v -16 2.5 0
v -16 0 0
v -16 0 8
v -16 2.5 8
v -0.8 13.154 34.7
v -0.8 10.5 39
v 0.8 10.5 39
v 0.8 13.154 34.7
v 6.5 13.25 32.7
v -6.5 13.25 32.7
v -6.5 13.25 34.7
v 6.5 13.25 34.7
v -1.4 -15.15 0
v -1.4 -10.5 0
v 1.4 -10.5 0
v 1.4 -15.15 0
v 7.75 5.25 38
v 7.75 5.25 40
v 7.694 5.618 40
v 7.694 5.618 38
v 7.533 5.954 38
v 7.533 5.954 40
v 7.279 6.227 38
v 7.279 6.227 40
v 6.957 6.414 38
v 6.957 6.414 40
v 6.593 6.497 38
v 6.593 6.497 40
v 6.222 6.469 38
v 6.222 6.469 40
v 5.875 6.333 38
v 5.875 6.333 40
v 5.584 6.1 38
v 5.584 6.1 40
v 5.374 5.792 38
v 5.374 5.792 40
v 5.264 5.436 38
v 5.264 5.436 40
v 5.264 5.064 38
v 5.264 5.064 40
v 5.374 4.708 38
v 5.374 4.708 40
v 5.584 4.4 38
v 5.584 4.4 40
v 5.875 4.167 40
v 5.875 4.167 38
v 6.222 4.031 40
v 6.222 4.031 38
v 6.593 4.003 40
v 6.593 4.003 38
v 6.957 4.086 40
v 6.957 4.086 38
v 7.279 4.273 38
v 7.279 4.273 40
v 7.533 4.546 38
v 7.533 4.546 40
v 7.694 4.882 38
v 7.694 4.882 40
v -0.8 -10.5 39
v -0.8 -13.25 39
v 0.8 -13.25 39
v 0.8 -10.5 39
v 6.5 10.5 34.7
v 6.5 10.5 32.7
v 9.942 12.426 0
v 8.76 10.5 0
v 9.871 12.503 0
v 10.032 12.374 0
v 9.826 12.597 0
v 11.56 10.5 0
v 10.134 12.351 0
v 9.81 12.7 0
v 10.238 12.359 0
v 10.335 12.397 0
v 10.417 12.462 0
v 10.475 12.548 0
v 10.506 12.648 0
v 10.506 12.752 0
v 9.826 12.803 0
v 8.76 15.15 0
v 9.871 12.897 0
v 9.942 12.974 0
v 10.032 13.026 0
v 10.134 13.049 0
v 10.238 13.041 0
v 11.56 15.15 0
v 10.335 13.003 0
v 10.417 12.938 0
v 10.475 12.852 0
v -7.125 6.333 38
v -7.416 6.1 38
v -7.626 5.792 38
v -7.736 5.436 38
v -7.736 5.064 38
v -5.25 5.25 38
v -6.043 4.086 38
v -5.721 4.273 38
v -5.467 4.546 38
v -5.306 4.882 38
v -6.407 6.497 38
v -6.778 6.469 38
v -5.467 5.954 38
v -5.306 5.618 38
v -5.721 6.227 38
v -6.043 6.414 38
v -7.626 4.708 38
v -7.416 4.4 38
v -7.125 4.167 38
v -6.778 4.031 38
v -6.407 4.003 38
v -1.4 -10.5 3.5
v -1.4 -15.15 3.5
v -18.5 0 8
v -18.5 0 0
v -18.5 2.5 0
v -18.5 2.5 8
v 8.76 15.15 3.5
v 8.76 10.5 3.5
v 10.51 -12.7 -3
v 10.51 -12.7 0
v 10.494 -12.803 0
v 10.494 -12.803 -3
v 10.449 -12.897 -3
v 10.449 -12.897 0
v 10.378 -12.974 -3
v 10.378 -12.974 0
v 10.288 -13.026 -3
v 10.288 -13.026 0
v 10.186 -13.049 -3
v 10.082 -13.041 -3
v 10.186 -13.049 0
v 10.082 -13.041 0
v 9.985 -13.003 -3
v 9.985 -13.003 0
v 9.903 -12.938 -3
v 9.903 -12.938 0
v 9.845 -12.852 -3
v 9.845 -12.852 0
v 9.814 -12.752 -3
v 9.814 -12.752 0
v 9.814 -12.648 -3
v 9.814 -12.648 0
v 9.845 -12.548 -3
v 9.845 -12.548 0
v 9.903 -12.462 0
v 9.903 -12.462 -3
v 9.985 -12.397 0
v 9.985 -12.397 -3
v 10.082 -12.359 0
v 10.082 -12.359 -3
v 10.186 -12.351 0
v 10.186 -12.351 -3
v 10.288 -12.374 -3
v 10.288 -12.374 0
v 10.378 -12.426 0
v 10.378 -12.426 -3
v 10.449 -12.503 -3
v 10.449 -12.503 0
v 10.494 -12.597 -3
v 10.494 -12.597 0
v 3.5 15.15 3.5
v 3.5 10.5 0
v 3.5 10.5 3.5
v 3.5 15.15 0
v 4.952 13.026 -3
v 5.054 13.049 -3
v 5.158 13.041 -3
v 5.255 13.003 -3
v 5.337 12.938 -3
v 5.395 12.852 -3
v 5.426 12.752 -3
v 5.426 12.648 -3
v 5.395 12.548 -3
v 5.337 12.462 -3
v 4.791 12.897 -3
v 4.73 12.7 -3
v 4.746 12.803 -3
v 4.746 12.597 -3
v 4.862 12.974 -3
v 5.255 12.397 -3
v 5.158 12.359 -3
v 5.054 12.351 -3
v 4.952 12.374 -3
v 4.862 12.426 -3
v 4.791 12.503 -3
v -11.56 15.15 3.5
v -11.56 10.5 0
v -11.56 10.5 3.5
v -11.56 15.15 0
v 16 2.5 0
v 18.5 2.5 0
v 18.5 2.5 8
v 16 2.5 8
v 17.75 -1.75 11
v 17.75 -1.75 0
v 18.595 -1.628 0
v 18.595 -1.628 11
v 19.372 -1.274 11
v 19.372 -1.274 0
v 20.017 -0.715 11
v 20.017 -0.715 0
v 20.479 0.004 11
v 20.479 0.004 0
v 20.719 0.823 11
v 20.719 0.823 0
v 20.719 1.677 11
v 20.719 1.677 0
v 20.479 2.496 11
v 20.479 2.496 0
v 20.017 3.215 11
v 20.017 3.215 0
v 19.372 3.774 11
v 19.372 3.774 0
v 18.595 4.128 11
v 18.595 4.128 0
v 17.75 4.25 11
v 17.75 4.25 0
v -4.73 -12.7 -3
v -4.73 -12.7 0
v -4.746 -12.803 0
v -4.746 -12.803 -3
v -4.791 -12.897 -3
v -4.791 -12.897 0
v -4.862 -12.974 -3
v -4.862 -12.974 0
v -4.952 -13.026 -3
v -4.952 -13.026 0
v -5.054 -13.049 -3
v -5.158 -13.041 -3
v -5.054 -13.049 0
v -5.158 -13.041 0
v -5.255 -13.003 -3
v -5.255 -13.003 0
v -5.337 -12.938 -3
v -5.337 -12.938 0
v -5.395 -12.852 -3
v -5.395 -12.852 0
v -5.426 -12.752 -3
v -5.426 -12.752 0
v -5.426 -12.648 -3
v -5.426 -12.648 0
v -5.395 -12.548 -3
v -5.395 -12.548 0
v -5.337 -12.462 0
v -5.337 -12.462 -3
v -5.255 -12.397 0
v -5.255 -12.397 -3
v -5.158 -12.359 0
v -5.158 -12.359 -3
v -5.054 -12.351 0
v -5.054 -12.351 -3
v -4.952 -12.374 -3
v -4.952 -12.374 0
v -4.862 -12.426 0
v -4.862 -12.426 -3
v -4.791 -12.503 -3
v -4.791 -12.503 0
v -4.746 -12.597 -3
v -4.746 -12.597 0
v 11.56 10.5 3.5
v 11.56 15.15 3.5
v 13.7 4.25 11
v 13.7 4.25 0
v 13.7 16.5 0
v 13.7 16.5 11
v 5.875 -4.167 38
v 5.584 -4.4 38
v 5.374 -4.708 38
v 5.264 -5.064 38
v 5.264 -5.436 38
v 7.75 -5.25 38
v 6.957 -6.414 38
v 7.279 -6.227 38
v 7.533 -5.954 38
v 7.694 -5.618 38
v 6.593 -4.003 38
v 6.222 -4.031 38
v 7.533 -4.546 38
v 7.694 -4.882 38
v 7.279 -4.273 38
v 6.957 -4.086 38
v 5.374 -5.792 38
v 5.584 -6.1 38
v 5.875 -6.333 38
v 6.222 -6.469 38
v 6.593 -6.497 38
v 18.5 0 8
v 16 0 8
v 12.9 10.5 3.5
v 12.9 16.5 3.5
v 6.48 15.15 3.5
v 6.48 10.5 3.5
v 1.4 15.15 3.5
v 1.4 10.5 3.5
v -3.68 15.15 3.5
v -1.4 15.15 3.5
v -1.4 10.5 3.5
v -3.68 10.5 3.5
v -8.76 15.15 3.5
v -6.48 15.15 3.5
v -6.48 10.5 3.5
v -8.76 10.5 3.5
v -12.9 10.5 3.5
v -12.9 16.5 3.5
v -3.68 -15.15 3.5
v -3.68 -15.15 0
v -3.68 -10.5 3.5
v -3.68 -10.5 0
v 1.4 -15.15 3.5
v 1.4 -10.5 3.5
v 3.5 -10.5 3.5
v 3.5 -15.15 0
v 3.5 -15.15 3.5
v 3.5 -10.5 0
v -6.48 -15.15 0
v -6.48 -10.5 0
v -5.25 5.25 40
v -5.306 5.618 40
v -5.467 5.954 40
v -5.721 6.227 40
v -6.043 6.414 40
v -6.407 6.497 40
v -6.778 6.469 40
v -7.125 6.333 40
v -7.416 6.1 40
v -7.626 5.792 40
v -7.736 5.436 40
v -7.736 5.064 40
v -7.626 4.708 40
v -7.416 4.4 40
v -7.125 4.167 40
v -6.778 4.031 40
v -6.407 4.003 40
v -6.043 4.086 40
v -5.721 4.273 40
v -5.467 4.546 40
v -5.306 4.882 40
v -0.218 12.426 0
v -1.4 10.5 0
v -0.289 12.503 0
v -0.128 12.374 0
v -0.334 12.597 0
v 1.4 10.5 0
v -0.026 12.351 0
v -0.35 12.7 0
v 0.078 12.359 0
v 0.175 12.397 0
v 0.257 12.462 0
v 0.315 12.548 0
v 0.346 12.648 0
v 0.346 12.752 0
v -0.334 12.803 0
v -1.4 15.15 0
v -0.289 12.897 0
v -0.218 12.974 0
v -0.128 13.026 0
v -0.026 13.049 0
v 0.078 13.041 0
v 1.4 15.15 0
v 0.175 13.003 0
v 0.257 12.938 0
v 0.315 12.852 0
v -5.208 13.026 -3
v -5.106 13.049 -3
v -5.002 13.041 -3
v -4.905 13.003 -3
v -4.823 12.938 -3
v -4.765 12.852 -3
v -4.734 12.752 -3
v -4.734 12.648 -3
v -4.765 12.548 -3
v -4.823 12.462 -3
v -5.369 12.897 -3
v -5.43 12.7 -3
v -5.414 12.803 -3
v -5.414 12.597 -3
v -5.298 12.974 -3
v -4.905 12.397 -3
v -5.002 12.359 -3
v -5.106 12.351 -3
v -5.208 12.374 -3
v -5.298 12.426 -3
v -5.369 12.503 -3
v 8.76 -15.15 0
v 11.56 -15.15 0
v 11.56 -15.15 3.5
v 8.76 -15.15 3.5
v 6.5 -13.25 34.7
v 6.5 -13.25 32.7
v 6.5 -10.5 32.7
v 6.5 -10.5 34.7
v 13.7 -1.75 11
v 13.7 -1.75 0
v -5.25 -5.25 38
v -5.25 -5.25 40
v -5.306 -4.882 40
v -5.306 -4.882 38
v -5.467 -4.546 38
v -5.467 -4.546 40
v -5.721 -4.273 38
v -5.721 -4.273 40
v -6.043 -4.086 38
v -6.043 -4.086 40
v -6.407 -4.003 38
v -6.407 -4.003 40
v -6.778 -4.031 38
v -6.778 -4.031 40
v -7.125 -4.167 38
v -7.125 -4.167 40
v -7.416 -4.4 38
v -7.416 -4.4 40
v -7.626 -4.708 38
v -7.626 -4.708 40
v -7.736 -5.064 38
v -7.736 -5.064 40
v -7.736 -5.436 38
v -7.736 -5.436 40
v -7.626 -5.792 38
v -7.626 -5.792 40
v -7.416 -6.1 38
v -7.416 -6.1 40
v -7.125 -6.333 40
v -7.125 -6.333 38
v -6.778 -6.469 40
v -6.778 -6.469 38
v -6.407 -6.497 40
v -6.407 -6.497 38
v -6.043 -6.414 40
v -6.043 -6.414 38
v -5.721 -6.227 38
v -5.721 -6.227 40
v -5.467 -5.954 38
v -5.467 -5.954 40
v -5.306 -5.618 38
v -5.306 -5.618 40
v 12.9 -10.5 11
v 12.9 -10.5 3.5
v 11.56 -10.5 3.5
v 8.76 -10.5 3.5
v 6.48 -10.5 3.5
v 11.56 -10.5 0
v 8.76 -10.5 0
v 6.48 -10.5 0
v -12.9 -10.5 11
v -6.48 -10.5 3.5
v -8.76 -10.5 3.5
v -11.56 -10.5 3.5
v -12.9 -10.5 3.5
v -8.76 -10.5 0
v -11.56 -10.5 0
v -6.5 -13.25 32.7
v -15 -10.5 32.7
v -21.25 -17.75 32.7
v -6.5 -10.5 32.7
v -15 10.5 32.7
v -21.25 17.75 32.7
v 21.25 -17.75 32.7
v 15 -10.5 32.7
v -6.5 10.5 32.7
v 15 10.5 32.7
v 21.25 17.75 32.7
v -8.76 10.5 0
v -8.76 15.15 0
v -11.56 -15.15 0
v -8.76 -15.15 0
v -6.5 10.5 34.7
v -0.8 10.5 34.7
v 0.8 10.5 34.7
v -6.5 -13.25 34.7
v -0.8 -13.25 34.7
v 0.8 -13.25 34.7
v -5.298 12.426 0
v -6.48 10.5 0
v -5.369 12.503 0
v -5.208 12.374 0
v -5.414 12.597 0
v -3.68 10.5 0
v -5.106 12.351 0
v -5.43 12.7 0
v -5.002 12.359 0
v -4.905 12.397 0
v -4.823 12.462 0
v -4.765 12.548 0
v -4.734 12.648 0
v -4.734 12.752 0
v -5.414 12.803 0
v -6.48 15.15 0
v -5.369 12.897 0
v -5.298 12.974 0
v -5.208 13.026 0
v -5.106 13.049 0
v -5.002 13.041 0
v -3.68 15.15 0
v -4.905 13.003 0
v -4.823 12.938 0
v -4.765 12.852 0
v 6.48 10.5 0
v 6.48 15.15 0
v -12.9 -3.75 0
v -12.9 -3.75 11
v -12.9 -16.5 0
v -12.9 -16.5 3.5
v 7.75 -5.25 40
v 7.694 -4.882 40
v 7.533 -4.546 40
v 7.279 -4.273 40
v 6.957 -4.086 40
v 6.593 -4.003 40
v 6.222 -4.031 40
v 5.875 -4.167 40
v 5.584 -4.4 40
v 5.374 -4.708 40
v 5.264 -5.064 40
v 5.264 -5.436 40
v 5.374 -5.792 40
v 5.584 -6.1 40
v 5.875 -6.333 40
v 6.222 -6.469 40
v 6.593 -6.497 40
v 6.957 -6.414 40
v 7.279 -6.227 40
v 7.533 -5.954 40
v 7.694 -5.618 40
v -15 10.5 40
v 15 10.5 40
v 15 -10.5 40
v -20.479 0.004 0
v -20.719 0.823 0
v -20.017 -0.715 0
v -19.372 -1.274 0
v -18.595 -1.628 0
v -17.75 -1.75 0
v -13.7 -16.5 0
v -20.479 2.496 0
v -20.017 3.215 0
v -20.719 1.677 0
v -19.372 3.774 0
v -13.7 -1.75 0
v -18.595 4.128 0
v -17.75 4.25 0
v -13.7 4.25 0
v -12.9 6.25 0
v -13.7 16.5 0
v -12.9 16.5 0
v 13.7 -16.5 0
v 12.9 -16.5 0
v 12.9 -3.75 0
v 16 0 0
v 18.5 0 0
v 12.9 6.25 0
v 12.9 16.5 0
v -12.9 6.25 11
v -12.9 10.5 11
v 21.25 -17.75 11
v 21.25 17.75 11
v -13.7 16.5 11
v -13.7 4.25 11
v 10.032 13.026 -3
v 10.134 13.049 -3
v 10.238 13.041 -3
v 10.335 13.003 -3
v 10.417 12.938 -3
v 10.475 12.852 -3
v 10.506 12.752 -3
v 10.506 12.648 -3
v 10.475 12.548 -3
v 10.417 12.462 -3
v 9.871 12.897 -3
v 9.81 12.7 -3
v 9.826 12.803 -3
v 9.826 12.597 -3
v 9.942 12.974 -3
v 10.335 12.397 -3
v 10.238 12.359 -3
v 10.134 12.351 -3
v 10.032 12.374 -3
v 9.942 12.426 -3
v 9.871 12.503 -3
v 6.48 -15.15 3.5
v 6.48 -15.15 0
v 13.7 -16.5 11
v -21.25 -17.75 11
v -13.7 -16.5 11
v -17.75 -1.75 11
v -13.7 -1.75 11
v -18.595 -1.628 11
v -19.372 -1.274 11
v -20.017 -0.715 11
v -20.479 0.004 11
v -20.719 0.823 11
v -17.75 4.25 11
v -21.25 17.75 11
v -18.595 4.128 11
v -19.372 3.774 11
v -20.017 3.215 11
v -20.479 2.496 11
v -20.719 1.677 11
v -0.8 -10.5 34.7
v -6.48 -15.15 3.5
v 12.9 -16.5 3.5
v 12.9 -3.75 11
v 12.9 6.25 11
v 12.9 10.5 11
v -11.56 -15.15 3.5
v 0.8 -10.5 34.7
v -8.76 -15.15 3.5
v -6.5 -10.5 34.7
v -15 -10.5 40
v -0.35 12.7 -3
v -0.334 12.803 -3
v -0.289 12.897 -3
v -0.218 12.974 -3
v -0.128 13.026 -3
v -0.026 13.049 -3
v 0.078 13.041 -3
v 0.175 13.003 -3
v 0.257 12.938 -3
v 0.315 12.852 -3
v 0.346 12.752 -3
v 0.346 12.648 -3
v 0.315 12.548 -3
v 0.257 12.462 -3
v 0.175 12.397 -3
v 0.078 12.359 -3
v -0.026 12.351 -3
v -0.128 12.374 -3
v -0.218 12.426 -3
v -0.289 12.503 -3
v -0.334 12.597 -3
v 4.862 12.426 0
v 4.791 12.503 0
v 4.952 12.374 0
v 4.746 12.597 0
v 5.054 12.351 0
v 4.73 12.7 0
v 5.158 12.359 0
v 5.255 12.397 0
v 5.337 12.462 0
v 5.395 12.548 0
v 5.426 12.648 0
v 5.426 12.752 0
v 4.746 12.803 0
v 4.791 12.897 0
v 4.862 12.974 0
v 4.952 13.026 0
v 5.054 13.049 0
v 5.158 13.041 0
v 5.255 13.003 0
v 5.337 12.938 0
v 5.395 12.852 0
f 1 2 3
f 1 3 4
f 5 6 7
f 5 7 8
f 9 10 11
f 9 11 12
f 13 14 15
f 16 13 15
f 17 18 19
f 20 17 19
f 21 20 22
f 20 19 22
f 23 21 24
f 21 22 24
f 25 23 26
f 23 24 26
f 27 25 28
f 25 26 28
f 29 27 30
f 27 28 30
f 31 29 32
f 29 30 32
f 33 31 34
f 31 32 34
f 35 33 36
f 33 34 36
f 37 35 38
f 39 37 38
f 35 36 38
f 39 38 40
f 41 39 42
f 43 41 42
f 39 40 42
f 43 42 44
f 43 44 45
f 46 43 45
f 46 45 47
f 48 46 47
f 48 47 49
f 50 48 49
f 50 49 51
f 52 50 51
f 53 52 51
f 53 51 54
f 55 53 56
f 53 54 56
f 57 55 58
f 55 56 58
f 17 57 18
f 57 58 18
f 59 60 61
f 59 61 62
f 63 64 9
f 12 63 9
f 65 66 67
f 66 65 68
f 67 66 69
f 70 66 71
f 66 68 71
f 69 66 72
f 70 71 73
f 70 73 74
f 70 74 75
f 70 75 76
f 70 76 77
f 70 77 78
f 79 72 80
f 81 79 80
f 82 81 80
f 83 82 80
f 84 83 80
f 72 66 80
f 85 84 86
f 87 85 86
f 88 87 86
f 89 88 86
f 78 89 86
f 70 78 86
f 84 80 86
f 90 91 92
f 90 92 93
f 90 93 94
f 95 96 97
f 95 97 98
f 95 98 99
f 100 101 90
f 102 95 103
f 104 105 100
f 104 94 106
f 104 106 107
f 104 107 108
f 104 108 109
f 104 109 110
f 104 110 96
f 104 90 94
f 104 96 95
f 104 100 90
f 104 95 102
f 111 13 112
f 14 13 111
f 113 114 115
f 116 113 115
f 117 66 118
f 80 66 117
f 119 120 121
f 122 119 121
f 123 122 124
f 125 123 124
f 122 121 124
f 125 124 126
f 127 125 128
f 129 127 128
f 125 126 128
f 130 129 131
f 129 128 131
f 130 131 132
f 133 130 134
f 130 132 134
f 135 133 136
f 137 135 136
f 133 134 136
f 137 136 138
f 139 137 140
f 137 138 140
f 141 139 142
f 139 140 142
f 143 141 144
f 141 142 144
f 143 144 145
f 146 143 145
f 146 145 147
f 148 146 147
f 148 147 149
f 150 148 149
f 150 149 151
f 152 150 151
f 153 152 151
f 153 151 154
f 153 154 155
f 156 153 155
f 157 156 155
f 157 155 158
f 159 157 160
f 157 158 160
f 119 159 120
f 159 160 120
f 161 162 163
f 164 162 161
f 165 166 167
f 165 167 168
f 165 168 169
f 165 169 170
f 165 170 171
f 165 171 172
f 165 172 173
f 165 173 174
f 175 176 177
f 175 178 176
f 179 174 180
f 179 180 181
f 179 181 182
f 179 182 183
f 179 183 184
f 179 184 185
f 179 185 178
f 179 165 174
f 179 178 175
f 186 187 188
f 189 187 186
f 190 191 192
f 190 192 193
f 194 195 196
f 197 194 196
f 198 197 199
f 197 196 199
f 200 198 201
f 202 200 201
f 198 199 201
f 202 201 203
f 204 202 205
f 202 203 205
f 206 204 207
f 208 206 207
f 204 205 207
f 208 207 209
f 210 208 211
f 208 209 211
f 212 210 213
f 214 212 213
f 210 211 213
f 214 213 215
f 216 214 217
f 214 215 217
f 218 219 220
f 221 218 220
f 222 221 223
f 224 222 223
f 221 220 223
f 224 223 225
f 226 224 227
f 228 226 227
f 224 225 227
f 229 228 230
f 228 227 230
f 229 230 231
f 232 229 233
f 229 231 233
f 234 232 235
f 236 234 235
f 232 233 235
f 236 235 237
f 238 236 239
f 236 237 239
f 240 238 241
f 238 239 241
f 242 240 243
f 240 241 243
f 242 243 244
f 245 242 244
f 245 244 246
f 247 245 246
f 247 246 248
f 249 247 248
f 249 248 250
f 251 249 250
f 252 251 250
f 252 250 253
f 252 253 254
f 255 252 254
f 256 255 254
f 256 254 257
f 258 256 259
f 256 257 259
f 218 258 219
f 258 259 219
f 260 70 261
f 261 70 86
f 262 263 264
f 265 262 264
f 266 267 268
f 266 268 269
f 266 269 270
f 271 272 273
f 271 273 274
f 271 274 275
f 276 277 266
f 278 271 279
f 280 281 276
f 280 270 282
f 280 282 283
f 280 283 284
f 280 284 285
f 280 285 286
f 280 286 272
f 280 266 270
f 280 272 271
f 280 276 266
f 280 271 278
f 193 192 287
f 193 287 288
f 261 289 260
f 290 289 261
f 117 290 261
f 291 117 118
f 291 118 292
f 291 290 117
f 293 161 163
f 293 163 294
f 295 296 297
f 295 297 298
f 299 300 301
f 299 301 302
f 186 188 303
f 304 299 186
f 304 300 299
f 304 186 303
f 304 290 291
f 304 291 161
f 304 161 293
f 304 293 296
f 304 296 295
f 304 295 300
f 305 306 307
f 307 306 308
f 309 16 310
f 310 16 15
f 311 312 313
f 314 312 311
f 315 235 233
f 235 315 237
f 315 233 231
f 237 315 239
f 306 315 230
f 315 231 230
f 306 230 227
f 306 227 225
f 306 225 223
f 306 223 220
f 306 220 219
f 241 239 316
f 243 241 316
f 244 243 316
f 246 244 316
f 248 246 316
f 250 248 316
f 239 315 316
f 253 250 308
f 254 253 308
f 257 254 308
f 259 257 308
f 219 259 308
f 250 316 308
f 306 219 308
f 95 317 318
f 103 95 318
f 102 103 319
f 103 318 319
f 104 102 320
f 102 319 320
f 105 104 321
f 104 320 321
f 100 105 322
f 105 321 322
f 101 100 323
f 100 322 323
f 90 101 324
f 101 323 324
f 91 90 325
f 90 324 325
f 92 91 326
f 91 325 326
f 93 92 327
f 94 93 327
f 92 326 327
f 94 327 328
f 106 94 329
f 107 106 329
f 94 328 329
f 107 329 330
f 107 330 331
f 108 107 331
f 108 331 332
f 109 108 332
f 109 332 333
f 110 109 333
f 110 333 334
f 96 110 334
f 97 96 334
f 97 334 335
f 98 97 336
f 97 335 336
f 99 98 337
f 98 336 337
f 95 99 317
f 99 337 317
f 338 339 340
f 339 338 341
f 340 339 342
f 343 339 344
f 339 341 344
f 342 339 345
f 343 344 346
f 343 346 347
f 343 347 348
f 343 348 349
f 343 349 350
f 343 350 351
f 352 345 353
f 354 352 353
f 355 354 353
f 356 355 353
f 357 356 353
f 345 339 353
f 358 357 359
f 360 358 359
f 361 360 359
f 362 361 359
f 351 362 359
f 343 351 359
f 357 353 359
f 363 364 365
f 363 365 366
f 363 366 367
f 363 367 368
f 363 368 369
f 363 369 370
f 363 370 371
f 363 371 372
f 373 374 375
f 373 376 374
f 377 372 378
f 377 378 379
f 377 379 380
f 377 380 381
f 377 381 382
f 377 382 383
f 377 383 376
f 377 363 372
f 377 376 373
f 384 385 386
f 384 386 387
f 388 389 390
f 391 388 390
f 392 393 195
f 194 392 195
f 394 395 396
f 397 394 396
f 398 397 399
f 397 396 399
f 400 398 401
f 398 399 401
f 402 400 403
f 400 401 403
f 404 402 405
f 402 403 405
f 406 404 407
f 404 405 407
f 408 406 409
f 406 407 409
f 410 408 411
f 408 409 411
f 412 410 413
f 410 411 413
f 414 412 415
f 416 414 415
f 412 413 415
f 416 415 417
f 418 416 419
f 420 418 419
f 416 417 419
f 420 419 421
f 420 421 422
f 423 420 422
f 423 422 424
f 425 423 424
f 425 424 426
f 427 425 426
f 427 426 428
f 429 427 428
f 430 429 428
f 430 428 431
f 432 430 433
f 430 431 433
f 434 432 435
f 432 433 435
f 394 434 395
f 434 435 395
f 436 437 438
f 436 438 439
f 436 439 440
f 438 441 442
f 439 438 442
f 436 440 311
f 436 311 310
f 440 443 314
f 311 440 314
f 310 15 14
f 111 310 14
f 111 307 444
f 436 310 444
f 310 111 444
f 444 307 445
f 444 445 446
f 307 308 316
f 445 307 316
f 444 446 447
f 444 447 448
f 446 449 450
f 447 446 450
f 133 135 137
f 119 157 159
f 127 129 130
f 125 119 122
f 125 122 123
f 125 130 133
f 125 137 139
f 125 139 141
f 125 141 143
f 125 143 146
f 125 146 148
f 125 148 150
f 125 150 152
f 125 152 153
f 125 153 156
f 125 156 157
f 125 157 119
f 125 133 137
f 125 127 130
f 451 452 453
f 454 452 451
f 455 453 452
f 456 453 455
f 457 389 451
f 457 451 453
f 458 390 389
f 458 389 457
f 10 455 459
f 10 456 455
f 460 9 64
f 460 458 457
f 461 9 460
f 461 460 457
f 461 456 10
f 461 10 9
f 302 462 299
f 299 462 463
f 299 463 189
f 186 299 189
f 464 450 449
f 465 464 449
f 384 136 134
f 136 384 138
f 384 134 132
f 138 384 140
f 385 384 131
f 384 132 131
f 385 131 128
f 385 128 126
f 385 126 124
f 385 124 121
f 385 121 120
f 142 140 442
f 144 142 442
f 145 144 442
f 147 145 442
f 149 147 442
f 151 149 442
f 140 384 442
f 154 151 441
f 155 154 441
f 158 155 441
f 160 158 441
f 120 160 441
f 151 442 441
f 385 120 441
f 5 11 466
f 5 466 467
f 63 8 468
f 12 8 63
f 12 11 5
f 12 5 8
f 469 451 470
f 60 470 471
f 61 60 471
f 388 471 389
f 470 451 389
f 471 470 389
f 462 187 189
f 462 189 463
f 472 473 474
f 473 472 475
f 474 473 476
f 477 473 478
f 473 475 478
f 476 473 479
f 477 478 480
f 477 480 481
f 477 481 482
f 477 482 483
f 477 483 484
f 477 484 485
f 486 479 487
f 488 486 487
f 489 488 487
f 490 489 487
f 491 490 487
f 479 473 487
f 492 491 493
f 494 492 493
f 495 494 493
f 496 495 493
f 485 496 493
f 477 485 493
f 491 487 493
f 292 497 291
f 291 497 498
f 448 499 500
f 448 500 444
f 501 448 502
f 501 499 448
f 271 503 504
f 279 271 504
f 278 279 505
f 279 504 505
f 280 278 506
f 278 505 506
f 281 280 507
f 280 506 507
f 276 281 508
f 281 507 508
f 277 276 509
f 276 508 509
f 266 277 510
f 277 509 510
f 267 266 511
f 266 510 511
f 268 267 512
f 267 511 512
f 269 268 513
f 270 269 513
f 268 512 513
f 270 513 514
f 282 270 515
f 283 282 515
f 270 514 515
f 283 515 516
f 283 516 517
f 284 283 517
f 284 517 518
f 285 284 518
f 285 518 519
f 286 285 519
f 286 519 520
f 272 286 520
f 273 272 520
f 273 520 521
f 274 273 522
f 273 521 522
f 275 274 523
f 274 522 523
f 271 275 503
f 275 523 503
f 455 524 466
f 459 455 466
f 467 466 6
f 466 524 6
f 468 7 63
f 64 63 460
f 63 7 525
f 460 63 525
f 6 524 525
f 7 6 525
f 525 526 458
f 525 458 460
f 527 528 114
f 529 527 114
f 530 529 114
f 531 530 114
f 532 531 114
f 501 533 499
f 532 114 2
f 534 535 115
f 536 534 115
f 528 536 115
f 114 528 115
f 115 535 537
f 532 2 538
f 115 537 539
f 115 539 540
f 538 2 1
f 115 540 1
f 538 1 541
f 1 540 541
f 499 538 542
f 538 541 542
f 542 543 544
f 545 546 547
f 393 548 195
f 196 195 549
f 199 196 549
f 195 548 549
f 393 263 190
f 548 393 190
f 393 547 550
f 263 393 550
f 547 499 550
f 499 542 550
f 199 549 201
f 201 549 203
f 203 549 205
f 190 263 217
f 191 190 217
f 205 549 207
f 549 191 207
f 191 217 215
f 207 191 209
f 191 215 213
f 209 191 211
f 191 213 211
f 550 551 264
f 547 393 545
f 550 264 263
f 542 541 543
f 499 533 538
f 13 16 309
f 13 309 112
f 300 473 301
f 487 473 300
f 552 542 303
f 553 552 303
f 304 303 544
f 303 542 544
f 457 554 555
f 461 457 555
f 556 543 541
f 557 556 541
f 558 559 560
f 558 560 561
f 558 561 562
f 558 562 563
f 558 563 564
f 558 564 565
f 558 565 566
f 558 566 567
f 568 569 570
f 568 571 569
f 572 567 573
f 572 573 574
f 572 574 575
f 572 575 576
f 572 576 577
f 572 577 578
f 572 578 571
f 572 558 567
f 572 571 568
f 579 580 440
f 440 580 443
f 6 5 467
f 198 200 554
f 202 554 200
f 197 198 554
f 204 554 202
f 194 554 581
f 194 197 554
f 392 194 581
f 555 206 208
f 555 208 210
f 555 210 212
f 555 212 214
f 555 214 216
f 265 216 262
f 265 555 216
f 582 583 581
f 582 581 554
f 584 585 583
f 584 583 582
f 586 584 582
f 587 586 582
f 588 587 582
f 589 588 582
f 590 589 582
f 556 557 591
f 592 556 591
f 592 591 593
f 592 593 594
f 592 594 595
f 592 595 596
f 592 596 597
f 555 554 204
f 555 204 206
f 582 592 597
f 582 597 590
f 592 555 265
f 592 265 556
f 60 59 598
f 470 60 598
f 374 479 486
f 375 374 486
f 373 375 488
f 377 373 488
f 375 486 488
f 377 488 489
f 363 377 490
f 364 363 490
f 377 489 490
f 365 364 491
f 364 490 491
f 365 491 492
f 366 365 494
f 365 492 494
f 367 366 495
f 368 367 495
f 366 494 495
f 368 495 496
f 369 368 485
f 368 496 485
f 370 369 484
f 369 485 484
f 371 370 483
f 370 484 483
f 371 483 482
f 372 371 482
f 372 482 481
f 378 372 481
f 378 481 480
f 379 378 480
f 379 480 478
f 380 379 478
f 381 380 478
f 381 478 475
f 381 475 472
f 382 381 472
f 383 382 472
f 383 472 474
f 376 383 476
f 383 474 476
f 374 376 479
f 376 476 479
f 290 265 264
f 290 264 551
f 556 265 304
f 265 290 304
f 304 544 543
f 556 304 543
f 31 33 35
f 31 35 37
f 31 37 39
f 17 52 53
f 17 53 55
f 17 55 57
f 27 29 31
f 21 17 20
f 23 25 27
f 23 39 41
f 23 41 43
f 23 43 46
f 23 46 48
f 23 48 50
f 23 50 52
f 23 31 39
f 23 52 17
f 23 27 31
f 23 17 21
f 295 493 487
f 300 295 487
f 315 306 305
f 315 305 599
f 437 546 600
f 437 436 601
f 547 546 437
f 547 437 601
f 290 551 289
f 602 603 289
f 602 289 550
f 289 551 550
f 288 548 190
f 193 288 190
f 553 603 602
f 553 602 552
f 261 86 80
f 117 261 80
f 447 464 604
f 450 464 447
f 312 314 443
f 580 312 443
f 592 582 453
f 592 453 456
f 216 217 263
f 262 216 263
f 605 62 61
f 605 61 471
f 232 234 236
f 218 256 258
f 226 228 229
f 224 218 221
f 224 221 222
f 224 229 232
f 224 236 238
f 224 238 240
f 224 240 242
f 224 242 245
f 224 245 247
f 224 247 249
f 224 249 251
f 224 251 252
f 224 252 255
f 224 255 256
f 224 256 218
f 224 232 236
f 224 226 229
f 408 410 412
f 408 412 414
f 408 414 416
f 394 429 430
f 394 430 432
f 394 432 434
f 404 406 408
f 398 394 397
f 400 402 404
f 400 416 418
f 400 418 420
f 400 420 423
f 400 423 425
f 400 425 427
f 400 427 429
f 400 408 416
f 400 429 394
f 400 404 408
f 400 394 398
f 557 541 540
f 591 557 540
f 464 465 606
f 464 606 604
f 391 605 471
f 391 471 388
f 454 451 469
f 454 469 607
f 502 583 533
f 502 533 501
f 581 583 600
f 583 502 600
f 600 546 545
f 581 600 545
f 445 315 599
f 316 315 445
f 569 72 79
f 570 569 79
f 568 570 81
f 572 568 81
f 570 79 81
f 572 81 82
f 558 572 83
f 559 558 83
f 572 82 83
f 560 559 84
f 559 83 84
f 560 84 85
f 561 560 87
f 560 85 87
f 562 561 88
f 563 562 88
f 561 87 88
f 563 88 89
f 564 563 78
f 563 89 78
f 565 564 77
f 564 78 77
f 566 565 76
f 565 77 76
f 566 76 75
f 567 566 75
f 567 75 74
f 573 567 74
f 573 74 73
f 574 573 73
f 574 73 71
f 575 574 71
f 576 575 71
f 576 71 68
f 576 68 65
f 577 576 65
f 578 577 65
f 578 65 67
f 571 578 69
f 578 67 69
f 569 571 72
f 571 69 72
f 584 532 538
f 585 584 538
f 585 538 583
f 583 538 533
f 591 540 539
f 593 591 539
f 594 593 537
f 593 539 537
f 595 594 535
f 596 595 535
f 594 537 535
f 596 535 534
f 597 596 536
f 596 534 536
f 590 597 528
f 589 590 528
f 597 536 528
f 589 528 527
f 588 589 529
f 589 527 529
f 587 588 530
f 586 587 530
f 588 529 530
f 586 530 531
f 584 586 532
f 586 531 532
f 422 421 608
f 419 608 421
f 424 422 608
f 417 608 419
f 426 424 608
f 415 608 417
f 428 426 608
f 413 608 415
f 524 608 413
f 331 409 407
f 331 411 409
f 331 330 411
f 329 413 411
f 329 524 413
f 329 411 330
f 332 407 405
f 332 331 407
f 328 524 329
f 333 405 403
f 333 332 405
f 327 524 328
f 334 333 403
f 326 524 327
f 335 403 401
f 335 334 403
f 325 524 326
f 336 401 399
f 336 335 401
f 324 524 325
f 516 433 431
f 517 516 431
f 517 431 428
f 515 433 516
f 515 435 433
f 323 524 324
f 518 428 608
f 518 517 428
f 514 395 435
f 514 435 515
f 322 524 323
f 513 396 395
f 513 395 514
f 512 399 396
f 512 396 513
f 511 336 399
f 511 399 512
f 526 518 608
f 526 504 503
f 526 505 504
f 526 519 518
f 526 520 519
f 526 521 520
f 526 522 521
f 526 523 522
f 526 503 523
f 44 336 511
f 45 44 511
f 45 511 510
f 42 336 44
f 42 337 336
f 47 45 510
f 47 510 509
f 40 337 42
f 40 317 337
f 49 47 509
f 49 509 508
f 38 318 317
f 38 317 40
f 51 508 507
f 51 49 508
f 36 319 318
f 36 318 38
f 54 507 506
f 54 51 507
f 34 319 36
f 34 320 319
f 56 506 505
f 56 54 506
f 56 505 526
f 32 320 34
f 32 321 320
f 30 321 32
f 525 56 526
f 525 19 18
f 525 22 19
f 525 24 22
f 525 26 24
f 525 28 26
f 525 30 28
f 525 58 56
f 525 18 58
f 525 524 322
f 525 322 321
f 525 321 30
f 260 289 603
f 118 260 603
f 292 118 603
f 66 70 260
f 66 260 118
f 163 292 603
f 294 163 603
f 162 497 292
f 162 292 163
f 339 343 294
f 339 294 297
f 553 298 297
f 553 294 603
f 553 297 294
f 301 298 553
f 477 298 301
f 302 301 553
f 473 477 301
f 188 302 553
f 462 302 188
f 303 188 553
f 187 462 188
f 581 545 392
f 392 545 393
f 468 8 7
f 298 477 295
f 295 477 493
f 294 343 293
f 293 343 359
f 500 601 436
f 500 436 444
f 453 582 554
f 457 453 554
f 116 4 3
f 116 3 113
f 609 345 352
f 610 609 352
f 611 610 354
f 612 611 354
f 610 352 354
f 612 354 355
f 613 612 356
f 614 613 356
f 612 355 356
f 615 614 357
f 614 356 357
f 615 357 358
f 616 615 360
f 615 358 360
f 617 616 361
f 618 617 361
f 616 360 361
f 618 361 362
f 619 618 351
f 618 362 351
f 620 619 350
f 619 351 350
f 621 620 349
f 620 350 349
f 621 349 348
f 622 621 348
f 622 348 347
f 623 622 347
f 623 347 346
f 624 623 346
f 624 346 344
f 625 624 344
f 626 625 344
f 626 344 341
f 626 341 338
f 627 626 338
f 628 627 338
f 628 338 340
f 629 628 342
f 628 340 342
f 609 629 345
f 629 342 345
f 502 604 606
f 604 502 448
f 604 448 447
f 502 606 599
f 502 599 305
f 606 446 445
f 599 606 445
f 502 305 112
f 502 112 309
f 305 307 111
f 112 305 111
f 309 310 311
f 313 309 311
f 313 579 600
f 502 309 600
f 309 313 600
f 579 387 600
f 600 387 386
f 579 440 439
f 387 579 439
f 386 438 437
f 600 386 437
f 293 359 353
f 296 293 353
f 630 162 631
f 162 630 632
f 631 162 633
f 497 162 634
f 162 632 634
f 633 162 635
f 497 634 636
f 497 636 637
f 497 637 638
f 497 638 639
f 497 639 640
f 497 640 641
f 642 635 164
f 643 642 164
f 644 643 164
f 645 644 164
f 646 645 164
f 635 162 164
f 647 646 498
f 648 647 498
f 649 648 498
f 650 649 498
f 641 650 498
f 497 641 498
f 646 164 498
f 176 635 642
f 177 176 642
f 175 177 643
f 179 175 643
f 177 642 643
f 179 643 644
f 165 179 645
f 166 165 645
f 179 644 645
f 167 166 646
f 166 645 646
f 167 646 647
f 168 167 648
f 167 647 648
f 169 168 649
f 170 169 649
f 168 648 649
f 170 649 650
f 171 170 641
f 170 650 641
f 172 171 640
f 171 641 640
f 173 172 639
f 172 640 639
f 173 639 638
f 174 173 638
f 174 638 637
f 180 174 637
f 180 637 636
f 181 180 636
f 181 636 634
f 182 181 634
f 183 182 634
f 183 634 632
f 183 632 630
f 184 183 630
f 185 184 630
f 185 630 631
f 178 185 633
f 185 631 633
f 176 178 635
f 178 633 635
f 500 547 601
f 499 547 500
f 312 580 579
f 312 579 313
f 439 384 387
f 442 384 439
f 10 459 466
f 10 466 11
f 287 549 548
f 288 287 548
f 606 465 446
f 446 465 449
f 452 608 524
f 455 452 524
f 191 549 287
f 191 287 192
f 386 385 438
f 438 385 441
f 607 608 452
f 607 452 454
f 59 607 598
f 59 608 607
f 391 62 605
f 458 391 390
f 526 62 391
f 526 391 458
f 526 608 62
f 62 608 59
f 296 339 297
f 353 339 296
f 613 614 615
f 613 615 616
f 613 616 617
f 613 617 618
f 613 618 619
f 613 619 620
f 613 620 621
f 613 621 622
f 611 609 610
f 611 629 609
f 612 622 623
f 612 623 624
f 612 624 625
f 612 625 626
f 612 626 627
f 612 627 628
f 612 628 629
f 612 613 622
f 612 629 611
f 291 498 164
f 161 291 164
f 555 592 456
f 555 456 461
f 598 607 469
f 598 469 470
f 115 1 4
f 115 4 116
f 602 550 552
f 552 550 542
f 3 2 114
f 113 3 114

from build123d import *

# Parameters (mm, degrees)
SKETCH_1_W                 = 42.5
SKETCH_1_H                 = 35.5
EXTRUDE_1_DEPTH            = 40
SKETCH_2_W                 = 42.5
SKETCH_2_H                 = 35.5
SKETCH_2_W_2               = 30
SKETCH_2_H_2               = 21
CUT_EXTRUDE_1_DEPTH        = 7.3
SKETCH_3_W                 = 13
SKETCH_3_H                 = 26.5
EXTRUDE_2_DEPTH            = 2
EXTRUDE_3_DEPTH            = 0.8
EXTRUDE_3_DEPTH_BACK       = 0.8
SKETCH_4_W                 = 4.3
SKETCH_4_H                 = 2.75
SKETCH_5_R                 = 1.25
CUT_EXTRUDE_2_DEPTH        = 2
SKETCH_6_W                 = 42.5
SKETCH_6_H                 = 35.5
CUT_EXTRUDE_3_DEPTH        = 11
SKETCH_7_W                 = 2.5
SKETCH_7_H                 = 2.5
CUT_EXTRUDE_4_DEPTH        = 8
SKETCH_8_W                 = 25.8
SKETCH_8_H                 = 4.25
SKETCH_8_H_2               = 6.75
CUT_EXTRUDE_5_DEPTH        = 11
CUT_EXTRUDE_6_DEPTH        = 3.5
SKETCH_10_W                = 2.1
SKETCH_10_H                = 4.65
SKETCH_10_W_2              = 2.28
SKETCH_10_W_3              = 0.939967479
CUT_EXTRUDE_7_DEPTH        = 3.5
SKETCH_11_R                = 0.35
EXTRUDE_4_DEPTH            = 3
PATTERN_LINEAR_1_COUNT     = 3
PATTERN_LINEAR_1_PITCH     = 5.08
PATTERN_LINEAR_1_COL_COUNT = 3
PATTERN_LINEAR_1_COL_PITCH = 5.08
CUT_EXTRUDE_START          = -3
SKETCH_12_R                = 0.35
CUT_EXTRUDE_8_DEPTH        = 3


with BuildPart() as part:
    # Эскиз1 → Вытянуть1 (new body)
    with BuildSketch(Plane.XY):
        Rectangle(SKETCH_1_W, SKETCH_1_H)
    extrude(amount=EXTRUDE_1_DEPTH)

    # Эскиз2 → Вырез-Вытянуть1 (cut)
    with BuildSketch(Plane.XY.offset(40)):
        Rectangle(SKETCH_2_W, SKETCH_2_H)
        Rectangle(SKETCH_2_W_2, SKETCH_2_H_2, mode=Mode.SUBTRACT)
    extrude(amount=-CUT_EXTRUDE_1_DEPTH, mode=Mode.SUBTRACT)

    # Эскиз3 → Вытянуть2 (add)
    with BuildSketch(Plane.XY.offset(32.7)):
        Rectangle(SKETCH_3_W, SKETCH_3_H)
    extrude(amount=EXTRUDE_2_DEPTH)

    # Эскиз4 → Вытянуть3 (add, two sides: drawn at the far end of the back side and taken through both)
    with BuildSketch(Plane(origin=(0, 0, 0), x_dir=(0, 0, -1), z_dir=(1, 0, 0)).offset(-EXTRUDE_3_DEPTH_BACK)):
        Polygon((-34.7, 10.5), (-39, 10.5), (-34.7, 13.153893026), align=None)
        with Locations((-36.85, -11.875)):
            Rectangle(SKETCH_4_W, SKETCH_4_H)
    extrude(amount=EXTRUDE_3_DEPTH + EXTRUDE_3_DEPTH_BACK)

    # Эскиз5 → Вырез-Вытянуть2 (cut)
    with BuildSketch(Plane.XY.offset(40)):
        with Locations((-6.5, 5.25)):
            Circle(SKETCH_5_R)
        with Locations((6.5, 5.25)):
            Circle(SKETCH_5_R)
        with Locations((6.5, -5.25)):
            Circle(SKETCH_5_R)
        with Locations((-6.5, -5.25)):
            Circle(SKETCH_5_R)
    extrude(amount=-CUT_EXTRUDE_2_DEPTH, mode=Mode.SUBTRACT)

    # Эскиз6 → Вырез-Вытянуть3 (cut)
    with BuildSketch(Plane(origin=(0, 0, 0), x_dir=(-1, 0, 0), z_dir=(0, 0, -1))):
        Rectangle(SKETCH_6_W, SKETCH_6_H)
        with BuildLine():
            Line((-17.75, 4.25), (-13.7, 4.25))
            Line((-13.7, 4.25), (-13.7, 16.5))
            Line((-13.7, 16.5), (13.7, 16.5))
            Line((13.7, 16.5), (13.7, 4.25))
            Line((13.7, 4.25), (17.75, 4.25))
            ThreePointArc((17.75, 4.25), (20.75, 1.25), (17.75, -1.75))
            Line((17.75, -1.75), (13.7, -1.75))
            Line((13.7, -1.75), (13.7, -16.5))
            Line((13.7, -16.5), (-13.7, -16.5))
            Line((-13.7, -16.5), (-13.7, -1.75))
            Line((-13.7, -1.75), (-17.75, -1.75))
            ThreePointArc((-17.75, -1.75), (-20.75, 1.25), (-17.75, 4.25))
        make_face(mode=Mode.SUBTRACT)
    extrude(amount=-CUT_EXTRUDE_3_DEPTH, mode=Mode.SUBTRACT)

    # Эскиз7 → Вырез-Вытянуть4 (cut)
    with BuildSketch(Plane(origin=(0, 0, 0), x_dir=(-1, 0, 0), z_dir=(0, 0, -1))):
        with Locations((17.25, 1.25)):
            Rectangle(SKETCH_7_W, SKETCH_7_H)
        with Locations((-17.25, 1.25)):
            Rectangle(SKETCH_7_W, SKETCH_7_H)
    extrude(amount=-CUT_EXTRUDE_4_DEPTH, mode=Mode.SUBTRACT)

    # Эскиз8 → Вырез-Вытянуть5 (cut)
    with BuildSketch(Plane(origin=(0, 0, 0), x_dir=(-1, 0, 0), z_dir=(0, 0, -1))):
        with Locations((0, 8.375)):
            Rectangle(SKETCH_8_W, SKETCH_8_H)
        with Locations((0, -7.125)):
            Rectangle(SKETCH_8_W, SKETCH_8_H_2)
    extrude(amount=-CUT_EXTRUDE_5_DEPTH, mode=Mode.SUBTRACT)

    # Эскиз9 → Вырез-Вытянуть6 (cut)
    with BuildSketch(Plane(origin=(0, 0, 0), x_dir=(-1, 0, 0), z_dir=(0, 0, -1))):
        Polygon((12.9, 16.5), (-12.9, 16.5), (-12.9, 10.5), (-12.1, 10.5), (-12.1, 15.15), (12.1, 15.15), (12.1, 10.5), (12.9, 10.5), align=None)
        Polygon((12.9, -10.5), (12.9, -16.5), (-12.9, -16.5), (-12.9, -10.5), (-12.1, -10.5), (-12.1, -15.15), (12.1, -15.15), (12.1, -10.5), align=None)
    extrude(amount=-CUT_EXTRUDE_6_DEPTH, mode=Mode.SUBTRACT)

    # Эскиз10 → Вырез-Вытянуть7 (cut)
    with BuildSketch(Plane(origin=(0, 0, 0), x_dir=(-1, 0, 0), z_dir=(0, 0, -1))):
        with Locations((-2.45, 12.825)):
            Rectangle(SKETCH_10_W, SKETCH_10_H)
        with Locations((2.54, 12.825)):
            Rectangle(SKETCH_10_W_2, SKETCH_10_H)
        with Locations((7.62, 12.825)):
            Rectangle(SKETCH_10_W_2, SKETCH_10_H)
        with Locations((12.02998374, 12.825)):
            Rectangle(SKETCH_10_W_3, SKETCH_10_H)
        with Locations((-12.02998374, 12.825)):
            Rectangle(SKETCH_10_W_3, SKETCH_10_H)
        with Locations((-7.62, 12.825)):
            Rectangle(SKETCH_10_W_2, SKETCH_10_H)
        with Locations((-7.62, -12.825)):
            Rectangle(SKETCH_10_W_2, SKETCH_10_H)
        with Locations((-12.02998374, -12.825)):
            Rectangle(SKETCH_10_W_3, SKETCH_10_H)
        with Locations((12.02998374, -12.825)):
            Rectangle(SKETCH_10_W_3, SKETCH_10_H)
        with Locations((7.62, -12.825)):
            Rectangle(SKETCH_10_W_2, SKETCH_10_H)
        with Locations((2.54, -12.825)):
            Rectangle(SKETCH_10_W_2, SKETCH_10_H)
        with Locations((-2.45, -12.825)):
            Rectangle(SKETCH_10_W, SKETCH_10_H)
    extrude(amount=-CUT_EXTRUDE_7_DEPTH, mode=Mode.SUBTRACT)

    # Эскиз11 → Вытянуть4 (add)
    with BuildSketch(Plane(origin=(0, 0, 0), x_dir=(-1, 0, 0), z_dir=(0, 0, -1))):
        with Locations((0, 12.7)):
            Circle(SKETCH_11_R)
        with Locations(Location((0, -12.7, 0), (0, 0, 180))):
            Circle(SKETCH_11_R)
    extrude_4 = extrude(amount=EXTRUDE_4_DEPTH)

    # Линейный массив1: Вытянуть4 ×3
    with Locations(*[(i * PATTERN_LINEAR_1_PITCH, 0, 0) for i in range(1, PATTERN_LINEAR_1_COUNT)]):
        add(extrude_4)

    # Линейный массив1 col: Вытянуть4 ×3
    with Locations(*[(-i * PATTERN_LINEAR_1_COL_PITCH, 0, 0) for i in range(1, PATTERN_LINEAR_1_COL_COUNT)]):
        add(extrude_4)

    # Эскиз12 → Вырез-Вытянуть8 (cut)
    with BuildSketch(Plane(origin=(0, 0, -3), x_dir=(-1, 0, 0), z_dir=(0, 0, -1)).offset(CUT_EXTRUDE_START)):
        with Locations((10.16, 12.7)):
            Circle(SKETCH_12_R)
        with Locations((10.16, -12.7)):
            Circle(SKETCH_12_R)
        with Locations((0, -12.7)):
            Circle(SKETCH_12_R)
        with Locations((-5.08, -12.7)):
            Circle(SKETCH_12_R)
    extrude(amount=CUT_EXTRUDE_8_DEPTH, mode=Mode.SUBTRACT)


solid = part.part
